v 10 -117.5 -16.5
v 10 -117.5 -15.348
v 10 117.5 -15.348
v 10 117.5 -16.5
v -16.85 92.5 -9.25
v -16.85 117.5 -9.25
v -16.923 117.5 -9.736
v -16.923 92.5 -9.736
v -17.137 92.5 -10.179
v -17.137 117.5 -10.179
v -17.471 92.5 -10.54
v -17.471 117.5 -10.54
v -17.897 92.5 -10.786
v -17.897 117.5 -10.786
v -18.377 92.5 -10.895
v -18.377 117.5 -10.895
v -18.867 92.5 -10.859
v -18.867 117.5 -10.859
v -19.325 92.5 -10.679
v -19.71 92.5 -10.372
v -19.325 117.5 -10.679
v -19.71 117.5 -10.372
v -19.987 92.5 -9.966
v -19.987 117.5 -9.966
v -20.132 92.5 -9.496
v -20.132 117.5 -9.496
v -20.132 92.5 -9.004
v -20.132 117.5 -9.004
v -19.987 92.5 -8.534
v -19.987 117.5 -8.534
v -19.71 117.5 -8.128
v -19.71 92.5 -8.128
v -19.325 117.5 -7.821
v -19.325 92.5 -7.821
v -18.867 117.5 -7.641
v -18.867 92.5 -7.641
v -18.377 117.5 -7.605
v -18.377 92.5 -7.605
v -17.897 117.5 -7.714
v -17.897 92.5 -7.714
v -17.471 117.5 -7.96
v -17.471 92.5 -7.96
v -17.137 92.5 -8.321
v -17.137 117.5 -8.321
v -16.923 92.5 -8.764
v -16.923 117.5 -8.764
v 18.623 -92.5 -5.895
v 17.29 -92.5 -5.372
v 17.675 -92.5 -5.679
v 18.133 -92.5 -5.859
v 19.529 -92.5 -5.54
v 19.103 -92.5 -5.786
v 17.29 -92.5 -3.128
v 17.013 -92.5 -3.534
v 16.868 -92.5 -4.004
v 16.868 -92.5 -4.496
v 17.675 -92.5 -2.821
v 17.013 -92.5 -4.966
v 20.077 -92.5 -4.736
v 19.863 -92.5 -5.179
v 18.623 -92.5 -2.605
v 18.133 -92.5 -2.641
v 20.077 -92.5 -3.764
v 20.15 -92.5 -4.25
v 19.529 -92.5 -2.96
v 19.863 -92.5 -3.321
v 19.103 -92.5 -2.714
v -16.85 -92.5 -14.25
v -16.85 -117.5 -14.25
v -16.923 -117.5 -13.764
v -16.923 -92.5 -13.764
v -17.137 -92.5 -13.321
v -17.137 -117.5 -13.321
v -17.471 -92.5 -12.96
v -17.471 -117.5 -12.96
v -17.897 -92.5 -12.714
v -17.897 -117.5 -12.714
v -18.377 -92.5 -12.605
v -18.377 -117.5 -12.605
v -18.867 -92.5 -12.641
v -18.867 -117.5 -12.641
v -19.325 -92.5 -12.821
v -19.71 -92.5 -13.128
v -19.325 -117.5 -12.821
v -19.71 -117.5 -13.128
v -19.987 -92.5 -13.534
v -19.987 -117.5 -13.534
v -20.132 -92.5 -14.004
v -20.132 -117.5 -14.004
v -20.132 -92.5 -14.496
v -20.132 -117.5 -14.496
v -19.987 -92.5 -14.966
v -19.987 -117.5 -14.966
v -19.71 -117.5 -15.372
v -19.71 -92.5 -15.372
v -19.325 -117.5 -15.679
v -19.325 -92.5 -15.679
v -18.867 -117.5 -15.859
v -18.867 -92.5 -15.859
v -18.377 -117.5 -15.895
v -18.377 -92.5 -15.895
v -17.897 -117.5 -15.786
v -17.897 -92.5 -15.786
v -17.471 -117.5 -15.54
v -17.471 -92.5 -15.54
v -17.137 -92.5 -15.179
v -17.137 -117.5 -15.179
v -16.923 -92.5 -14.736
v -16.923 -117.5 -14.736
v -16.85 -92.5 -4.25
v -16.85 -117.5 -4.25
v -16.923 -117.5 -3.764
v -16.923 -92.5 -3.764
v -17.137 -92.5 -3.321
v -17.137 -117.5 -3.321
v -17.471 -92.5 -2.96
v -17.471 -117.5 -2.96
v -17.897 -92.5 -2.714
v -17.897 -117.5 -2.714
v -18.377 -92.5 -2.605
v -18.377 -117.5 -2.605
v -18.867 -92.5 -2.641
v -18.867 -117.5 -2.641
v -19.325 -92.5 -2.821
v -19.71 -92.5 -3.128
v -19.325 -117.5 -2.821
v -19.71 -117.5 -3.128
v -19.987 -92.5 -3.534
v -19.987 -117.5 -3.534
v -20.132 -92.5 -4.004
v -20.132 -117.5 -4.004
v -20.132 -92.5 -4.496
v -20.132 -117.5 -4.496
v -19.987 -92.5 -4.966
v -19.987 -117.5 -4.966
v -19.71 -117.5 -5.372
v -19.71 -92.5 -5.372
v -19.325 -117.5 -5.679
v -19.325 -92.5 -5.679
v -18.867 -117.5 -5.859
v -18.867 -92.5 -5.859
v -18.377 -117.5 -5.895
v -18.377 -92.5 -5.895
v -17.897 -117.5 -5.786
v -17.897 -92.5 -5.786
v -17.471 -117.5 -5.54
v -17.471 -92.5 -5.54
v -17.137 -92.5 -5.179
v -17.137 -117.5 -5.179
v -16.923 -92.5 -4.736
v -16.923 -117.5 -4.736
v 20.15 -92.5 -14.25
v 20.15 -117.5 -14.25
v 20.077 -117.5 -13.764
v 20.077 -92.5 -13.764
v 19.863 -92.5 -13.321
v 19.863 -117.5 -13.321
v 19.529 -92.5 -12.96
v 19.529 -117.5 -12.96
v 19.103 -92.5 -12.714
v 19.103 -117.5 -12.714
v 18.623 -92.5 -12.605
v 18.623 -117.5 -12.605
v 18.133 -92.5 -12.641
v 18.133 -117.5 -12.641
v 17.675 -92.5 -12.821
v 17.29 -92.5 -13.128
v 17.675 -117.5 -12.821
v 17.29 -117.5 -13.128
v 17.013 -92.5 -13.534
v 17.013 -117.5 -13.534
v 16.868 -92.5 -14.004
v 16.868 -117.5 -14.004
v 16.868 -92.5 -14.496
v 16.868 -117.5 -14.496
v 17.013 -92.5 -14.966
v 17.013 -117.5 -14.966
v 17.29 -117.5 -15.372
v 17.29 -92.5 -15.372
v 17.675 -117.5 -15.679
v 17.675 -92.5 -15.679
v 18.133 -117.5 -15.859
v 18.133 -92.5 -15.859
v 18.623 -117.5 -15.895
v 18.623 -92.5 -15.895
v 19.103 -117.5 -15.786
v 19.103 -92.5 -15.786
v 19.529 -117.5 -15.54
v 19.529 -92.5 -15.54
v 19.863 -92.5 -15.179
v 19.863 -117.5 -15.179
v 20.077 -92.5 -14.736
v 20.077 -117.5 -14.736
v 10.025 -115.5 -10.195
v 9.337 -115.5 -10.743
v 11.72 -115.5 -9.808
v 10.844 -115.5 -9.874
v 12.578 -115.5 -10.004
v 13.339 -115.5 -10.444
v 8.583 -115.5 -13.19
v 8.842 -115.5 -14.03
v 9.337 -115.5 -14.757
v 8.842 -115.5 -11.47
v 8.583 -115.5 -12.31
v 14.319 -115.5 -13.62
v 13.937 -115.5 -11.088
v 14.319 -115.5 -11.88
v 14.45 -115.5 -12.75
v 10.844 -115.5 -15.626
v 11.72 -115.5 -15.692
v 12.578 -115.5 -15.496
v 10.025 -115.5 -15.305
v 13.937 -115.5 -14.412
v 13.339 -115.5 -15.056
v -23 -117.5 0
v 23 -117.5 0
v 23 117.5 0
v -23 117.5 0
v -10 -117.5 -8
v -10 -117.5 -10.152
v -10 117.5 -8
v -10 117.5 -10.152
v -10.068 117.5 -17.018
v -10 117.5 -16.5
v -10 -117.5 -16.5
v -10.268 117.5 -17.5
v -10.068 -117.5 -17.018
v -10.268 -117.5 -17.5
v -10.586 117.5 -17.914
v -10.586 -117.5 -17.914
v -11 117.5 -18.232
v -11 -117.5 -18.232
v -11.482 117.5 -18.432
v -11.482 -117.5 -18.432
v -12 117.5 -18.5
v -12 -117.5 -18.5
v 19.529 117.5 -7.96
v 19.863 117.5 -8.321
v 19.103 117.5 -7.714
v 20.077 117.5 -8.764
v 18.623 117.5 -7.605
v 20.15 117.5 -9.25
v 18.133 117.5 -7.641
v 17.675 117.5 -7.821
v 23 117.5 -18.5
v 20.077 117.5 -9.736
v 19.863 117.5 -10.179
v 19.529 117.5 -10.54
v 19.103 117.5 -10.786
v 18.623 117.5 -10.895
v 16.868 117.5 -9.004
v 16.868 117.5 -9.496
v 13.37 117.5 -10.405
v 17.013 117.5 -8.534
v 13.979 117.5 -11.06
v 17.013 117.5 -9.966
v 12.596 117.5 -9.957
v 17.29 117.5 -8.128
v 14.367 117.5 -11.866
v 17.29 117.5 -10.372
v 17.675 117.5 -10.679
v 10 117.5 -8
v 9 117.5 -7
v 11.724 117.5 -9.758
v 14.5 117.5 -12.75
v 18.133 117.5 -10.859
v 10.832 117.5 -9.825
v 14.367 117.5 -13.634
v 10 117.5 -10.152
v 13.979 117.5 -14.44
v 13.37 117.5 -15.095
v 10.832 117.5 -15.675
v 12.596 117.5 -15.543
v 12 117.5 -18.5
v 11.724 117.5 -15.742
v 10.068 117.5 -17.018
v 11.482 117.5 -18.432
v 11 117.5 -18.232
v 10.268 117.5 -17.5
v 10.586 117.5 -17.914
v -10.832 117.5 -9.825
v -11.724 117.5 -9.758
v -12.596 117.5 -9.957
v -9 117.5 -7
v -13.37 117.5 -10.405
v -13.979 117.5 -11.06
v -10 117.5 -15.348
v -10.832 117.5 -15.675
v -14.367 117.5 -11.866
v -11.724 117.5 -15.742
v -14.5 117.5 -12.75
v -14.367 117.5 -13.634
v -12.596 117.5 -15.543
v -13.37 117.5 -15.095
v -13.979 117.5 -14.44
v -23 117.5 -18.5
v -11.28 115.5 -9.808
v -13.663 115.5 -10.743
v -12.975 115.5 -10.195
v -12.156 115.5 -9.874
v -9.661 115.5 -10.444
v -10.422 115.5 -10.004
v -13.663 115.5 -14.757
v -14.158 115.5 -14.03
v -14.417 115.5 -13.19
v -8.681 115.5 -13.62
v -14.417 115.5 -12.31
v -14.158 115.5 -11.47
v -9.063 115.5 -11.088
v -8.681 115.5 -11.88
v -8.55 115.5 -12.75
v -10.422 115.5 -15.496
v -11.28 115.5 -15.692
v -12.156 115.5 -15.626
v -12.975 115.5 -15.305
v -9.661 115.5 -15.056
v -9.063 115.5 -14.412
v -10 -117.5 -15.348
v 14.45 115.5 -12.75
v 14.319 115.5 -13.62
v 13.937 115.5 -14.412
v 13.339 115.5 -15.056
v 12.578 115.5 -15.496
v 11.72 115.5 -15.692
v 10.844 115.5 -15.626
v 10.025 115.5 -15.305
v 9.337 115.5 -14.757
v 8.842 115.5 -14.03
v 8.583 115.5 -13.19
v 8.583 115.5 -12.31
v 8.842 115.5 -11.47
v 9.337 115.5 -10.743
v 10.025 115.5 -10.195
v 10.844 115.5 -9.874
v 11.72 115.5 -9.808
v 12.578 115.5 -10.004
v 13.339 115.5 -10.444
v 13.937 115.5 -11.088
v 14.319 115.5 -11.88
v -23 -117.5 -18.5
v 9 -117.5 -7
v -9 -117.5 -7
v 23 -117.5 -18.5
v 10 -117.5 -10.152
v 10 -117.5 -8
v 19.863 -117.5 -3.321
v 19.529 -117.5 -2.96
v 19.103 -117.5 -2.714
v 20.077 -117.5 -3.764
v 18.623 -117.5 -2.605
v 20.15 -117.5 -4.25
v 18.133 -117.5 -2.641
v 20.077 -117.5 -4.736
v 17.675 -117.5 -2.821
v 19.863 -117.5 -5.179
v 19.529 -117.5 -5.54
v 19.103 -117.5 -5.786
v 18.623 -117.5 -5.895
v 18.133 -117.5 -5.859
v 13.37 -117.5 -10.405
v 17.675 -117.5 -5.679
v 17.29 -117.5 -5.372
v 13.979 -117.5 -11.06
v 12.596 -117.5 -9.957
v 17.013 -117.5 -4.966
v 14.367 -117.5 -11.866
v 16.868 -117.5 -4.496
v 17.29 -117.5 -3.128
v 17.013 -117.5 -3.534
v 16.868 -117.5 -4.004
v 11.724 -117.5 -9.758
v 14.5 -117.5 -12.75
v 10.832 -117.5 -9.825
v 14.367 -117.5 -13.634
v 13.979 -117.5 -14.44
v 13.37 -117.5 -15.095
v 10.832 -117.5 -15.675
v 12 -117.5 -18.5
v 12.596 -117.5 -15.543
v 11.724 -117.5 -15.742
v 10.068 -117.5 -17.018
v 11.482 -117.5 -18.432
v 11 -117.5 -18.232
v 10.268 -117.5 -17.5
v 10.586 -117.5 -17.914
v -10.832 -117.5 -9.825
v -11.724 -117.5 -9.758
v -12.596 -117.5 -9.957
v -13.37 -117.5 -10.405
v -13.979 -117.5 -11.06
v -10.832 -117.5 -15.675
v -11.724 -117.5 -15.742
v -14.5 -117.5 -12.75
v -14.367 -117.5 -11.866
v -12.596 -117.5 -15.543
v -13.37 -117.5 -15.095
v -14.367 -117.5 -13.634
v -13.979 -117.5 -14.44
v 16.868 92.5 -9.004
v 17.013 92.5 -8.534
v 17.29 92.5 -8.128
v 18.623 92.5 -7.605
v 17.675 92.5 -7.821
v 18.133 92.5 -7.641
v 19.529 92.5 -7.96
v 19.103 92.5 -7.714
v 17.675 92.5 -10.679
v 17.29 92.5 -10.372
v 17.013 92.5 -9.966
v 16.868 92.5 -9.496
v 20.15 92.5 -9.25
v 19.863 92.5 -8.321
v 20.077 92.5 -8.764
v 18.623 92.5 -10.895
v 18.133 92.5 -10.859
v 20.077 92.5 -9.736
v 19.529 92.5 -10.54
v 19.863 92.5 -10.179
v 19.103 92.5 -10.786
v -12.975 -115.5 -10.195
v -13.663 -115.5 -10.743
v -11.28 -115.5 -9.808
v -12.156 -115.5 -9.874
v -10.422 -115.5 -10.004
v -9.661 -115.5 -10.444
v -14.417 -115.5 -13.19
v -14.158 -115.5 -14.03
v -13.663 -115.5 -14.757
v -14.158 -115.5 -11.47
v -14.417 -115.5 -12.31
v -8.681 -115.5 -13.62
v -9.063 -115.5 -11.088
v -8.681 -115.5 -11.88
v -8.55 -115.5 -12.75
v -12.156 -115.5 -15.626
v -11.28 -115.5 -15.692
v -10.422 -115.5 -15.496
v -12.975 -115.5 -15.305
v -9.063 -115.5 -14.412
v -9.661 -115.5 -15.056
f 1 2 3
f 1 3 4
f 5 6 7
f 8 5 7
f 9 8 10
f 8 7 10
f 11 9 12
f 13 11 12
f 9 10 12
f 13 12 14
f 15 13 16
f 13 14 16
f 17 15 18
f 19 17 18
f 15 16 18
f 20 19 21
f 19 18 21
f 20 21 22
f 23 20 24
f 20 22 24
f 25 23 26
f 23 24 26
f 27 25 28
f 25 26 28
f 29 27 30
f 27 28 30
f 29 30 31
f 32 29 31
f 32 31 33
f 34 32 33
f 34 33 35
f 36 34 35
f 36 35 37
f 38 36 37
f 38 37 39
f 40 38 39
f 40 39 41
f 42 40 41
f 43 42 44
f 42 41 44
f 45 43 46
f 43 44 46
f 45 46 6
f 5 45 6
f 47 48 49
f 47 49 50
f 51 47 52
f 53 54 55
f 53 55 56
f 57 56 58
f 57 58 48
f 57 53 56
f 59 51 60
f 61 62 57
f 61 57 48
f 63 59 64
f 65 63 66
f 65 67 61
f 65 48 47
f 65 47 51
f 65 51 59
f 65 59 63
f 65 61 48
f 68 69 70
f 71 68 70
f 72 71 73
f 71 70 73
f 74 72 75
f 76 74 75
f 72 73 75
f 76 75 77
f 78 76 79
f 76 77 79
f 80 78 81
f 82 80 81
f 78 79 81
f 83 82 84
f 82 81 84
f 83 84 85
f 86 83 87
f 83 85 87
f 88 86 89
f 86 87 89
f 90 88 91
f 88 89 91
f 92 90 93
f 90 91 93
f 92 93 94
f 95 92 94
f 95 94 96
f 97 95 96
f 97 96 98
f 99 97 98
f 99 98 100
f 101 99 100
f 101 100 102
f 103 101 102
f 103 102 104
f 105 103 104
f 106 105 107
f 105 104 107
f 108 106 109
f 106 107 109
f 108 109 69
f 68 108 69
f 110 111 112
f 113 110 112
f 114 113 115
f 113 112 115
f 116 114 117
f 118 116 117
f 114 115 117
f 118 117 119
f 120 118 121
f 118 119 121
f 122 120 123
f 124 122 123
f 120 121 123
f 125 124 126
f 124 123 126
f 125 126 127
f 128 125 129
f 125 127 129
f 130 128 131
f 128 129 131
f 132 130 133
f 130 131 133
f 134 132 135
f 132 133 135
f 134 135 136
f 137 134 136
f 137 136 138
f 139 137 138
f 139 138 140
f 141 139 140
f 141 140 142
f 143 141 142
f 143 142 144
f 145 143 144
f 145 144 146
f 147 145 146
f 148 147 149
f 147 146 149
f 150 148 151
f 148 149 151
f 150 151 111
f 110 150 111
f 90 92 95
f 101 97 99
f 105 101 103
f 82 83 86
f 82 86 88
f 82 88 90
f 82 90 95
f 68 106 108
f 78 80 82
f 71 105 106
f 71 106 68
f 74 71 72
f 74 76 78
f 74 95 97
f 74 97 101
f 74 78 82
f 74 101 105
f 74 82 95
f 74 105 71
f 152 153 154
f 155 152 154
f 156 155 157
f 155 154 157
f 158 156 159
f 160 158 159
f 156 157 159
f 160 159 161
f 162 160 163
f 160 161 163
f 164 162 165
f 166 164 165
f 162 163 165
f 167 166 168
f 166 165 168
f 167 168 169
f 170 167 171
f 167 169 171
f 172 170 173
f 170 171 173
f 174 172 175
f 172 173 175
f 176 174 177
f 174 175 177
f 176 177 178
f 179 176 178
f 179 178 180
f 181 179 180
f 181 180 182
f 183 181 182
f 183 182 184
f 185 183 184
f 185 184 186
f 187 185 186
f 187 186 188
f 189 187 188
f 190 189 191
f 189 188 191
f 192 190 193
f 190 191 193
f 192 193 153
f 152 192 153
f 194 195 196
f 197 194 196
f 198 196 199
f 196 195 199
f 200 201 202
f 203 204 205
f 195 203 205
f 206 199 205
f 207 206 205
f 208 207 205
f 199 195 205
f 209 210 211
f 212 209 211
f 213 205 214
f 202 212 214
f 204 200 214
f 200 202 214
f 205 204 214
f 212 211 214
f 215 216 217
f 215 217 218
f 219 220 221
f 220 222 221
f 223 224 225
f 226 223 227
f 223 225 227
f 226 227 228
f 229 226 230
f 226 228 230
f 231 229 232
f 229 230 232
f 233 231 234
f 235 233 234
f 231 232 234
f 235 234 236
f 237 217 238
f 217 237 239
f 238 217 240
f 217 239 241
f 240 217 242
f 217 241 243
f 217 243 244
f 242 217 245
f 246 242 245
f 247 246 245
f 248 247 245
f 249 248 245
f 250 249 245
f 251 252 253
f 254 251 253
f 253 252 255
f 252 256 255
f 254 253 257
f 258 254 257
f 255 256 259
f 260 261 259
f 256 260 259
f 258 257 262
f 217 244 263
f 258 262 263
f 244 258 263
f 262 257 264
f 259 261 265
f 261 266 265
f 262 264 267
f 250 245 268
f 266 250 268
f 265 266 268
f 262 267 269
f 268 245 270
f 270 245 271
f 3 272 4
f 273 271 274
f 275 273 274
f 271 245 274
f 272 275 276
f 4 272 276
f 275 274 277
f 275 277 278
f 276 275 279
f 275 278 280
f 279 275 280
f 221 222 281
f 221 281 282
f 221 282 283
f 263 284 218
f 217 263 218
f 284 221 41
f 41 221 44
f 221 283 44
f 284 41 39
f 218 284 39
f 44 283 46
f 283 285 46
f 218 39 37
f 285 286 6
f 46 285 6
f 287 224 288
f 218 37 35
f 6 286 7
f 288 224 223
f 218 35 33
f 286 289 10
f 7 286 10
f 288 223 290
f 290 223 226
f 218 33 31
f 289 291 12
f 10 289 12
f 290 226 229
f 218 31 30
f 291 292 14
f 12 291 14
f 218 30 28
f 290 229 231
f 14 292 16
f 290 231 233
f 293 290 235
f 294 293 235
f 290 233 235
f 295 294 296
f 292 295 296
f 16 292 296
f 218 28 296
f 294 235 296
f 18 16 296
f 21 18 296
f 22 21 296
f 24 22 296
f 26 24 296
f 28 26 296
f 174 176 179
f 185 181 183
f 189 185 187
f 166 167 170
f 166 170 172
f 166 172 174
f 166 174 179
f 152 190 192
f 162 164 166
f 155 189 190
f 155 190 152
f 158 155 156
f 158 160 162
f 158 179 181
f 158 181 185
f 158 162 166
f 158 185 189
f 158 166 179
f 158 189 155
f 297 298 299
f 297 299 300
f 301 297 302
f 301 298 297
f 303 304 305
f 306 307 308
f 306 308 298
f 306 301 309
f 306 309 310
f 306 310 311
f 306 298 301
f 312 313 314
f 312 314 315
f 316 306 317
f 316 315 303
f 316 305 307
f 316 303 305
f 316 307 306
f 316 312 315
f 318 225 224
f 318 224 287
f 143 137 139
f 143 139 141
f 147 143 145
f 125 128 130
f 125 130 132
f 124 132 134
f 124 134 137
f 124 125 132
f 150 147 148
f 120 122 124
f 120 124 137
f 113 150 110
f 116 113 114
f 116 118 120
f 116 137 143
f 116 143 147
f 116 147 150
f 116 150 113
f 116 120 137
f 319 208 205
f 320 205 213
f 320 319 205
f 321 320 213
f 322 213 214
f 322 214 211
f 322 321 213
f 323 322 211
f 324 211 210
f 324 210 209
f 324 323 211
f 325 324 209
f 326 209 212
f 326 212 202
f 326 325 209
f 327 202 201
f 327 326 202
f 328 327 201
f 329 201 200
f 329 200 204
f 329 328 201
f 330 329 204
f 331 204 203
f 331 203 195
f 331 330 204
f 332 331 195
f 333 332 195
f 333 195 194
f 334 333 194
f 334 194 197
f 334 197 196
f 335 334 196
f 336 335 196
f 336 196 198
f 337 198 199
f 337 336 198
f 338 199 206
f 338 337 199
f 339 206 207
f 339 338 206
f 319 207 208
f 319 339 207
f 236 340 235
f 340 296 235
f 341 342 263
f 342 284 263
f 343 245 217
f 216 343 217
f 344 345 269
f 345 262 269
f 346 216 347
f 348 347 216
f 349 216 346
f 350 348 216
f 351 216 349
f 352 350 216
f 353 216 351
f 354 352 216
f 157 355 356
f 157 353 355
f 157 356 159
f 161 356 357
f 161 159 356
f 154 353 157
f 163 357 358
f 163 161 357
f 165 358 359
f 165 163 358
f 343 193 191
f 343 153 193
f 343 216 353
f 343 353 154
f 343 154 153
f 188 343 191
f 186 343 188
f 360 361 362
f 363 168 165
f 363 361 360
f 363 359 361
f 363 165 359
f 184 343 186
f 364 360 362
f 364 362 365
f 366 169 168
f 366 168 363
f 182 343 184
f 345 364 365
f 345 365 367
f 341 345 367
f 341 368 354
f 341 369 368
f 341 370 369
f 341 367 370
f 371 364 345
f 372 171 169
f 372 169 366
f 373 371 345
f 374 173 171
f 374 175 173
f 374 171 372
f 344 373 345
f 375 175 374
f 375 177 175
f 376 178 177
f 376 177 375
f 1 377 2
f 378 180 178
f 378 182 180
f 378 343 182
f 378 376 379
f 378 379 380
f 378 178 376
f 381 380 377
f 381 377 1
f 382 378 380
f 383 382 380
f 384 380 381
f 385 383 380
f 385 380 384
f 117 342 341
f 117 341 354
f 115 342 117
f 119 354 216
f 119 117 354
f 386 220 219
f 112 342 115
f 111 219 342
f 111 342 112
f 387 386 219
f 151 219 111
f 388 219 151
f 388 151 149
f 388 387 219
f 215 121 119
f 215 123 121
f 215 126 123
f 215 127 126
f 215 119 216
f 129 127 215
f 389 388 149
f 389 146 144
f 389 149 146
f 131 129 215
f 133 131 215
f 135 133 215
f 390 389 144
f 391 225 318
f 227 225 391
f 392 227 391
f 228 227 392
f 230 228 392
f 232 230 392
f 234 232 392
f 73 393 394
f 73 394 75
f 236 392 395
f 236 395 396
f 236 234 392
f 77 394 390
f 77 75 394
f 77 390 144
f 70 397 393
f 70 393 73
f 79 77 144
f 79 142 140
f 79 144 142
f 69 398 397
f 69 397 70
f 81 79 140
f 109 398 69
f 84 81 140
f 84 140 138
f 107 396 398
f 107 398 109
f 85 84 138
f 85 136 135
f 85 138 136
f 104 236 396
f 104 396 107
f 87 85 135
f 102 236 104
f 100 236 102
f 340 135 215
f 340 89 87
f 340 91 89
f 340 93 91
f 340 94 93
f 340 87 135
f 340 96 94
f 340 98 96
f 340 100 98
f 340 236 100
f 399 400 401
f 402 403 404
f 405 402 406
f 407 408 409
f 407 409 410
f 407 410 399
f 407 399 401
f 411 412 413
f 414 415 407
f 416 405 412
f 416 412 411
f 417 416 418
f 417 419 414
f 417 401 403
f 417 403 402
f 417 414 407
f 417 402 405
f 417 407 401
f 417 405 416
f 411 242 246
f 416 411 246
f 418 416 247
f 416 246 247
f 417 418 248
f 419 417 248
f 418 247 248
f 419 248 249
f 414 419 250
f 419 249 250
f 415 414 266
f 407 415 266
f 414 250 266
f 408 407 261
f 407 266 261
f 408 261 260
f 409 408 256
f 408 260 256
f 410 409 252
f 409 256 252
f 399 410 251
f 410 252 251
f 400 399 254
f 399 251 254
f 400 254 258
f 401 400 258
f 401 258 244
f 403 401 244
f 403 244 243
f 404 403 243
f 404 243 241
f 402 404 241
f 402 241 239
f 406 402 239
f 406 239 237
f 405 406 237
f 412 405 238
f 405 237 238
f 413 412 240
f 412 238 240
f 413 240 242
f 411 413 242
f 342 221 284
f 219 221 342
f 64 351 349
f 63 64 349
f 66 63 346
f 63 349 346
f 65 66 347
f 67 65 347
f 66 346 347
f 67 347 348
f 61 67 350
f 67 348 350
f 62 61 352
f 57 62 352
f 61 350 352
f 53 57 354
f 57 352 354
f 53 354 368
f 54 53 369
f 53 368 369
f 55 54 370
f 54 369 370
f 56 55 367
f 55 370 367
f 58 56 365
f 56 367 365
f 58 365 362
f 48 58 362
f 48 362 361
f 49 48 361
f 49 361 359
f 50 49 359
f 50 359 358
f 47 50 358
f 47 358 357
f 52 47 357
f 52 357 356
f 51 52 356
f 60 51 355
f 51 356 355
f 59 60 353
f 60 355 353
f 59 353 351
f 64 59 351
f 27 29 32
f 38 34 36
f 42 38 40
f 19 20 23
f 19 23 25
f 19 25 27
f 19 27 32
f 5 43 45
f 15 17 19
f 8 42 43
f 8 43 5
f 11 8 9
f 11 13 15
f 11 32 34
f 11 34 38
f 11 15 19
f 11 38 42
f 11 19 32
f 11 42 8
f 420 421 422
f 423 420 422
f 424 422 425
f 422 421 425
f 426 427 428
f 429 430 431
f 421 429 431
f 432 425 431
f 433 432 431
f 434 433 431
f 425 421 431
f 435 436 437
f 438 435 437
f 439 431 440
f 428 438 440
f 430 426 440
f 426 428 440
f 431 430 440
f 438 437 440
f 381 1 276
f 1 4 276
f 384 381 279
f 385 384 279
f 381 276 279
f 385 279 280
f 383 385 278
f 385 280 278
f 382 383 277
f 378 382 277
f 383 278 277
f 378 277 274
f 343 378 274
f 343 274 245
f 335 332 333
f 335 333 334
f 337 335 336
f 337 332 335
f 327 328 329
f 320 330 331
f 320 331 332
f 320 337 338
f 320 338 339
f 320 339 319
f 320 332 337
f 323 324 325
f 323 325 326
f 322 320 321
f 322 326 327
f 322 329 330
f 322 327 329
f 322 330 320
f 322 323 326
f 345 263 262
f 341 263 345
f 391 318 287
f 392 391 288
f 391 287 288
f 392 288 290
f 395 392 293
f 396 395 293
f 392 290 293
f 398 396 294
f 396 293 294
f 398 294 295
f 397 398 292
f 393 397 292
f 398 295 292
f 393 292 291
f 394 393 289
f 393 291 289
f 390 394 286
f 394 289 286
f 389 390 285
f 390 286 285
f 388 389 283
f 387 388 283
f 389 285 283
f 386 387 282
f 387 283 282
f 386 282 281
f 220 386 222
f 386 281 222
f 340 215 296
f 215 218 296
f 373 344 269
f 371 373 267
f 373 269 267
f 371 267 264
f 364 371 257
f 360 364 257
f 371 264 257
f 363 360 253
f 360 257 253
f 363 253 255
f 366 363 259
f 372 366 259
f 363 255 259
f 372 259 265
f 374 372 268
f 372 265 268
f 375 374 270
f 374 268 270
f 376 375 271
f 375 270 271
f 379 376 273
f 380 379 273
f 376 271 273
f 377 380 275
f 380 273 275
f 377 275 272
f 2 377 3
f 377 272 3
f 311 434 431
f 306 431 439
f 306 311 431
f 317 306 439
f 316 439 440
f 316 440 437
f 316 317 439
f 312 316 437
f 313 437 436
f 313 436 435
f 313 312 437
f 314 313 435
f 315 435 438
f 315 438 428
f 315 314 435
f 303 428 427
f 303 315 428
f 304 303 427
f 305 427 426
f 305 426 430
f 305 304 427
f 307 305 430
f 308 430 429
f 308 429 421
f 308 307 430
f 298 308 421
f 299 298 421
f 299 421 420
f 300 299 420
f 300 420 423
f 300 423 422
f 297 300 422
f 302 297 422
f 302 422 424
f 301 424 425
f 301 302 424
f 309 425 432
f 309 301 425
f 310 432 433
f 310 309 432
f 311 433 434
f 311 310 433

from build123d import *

# Parameters (mm, degrees)
BOSS_EXTRUDE1_DEPTH   = 117.5
SKETCH2_R             = 2.95
BOSS_EXTRUDE2_DEPTH   = 115.5
BOSS_EXTRUDE2_2_DEPTH = 115.5
CHAMFER1_SIZE         = 1
FILLET1_R             = 2
SKETCH3_R             = 1.65
CUT_EXTRUDE1_DEPTH    = 25
SKETCH4_R             = 1.65
CUT_EXTRUDE2_DEPTH    = 25


with BuildPart() as part:
    # Sketch1 → Boss-Extrude1 (new body, symmetric)
    with BuildSketch(Plane(origin=(0, 0, 0), x_dir=(1, 0, 0), z_dir=(0, 1, 0))):
        with BuildLine():
            Line((23, 0), (-23, 0))
            Line((-23, 0), (-23, 18.5))
            Line((-23, 18.5), (-10, 18.5))
            Line((-10, 18.5), (-10, 15.348076211))
            ThreePointArc((-10, 15.348076211), (-14.5, 12.75), (-10, 10.151923789))
            Line((-10, 10.151923789), (-10, 7))
            Line((-10, 7), (10, 7))
            Line((10, 7), (10, 10.151923789))
            ThreePointArc((10, 10.151923789), (14.5, 12.75), (10, 15.348076211))
            Line((10, 15.348076211), (10, 18.5))
            Line((10, 18.5), (23, 18.5))
            Line((23, 18.5), (23, 0))
        make_face()
    extrude(amount=BOSS_EXTRUDE1_DEPTH, both=True)

    # Chamfer1
    chamfer1_edges = [part.edges().sort_by_distance(p)[0] for p in [
        (-10, 0, -7),
        (10, 0, -7),
    ]]
    chamfer(chamfer1_edges, length=CHAMFER1_SIZE)

    # Fillet1
    fillet1_edges = [part.edges().sort_by_distance(p)[0] for p in [
        (-10, 0, -18.5),
        (10, 0, -18.5),
    ]]
    fillet(fillet1_edges, radius=FILLET1_R)

    # Sketch3 → Cut-Extrude1 (cut)
    with BuildSketch(Plane(origin=(0, 117.5, 0), x_dir=(1, 0, 0), z_dir=(0, 1, 0))):
        with Locations((-18.5, 9.25)):
            Circle(SKETCH3_R)
        with Locations((18.5, 9.25)):
            Circle(SKETCH3_R)
    extrude(amount=-CUT_EXTRUDE1_DEPTH, mode=Mode.SUBTRACT)

    # Sketch4 → Cut-Extrude2 (cut)
    with BuildSketch(Plane.XZ.offset(117.5)):
        with Locations((-18.5, -14.25)):
            Circle(SKETCH4_R)
        with Locations((-18.5, -4.25)):
            Circle(SKETCH4_R)
        with Locations((18.5, -14.25)):
            Circle(SKETCH4_R)
        with Locations((18.5, -4.25)):
            Circle(SKETCH4_R)
    extrude(amount=-CUT_EXTRUDE2_DEPTH, mode=Mode.SUBTRACT)


with BuildPart() as body_2:
    # Sketch2 → Boss-Extrude2 (new body, symmetric)
    with BuildSketch(Plane(origin=(0, 0, 0), x_dir=(1, 0, 0), z_dir=(0, 1, 0))):
        with Locations((-11.5, 12.75)):
            Circle(SKETCH2_R)
    extrude(amount=BOSS_EXTRUDE2_DEPTH, both=True)


with BuildPart() as body_3:
    # Sketch2 → Boss-Extrude2 2 (new body, symmetric)
    with BuildSketch(Plane(origin=(0, 0, 0), x_dir=(1, 0, 0), z_dir=(0, 1, 0))):
        with Locations((11.5, 12.75)):
            Circle(SKETCH2_R)
    extrude(amount=BOSS_EXTRUDE2_2_DEPTH, both=True)


solid = Compound([part.part, body_2.part, body_3.part])
